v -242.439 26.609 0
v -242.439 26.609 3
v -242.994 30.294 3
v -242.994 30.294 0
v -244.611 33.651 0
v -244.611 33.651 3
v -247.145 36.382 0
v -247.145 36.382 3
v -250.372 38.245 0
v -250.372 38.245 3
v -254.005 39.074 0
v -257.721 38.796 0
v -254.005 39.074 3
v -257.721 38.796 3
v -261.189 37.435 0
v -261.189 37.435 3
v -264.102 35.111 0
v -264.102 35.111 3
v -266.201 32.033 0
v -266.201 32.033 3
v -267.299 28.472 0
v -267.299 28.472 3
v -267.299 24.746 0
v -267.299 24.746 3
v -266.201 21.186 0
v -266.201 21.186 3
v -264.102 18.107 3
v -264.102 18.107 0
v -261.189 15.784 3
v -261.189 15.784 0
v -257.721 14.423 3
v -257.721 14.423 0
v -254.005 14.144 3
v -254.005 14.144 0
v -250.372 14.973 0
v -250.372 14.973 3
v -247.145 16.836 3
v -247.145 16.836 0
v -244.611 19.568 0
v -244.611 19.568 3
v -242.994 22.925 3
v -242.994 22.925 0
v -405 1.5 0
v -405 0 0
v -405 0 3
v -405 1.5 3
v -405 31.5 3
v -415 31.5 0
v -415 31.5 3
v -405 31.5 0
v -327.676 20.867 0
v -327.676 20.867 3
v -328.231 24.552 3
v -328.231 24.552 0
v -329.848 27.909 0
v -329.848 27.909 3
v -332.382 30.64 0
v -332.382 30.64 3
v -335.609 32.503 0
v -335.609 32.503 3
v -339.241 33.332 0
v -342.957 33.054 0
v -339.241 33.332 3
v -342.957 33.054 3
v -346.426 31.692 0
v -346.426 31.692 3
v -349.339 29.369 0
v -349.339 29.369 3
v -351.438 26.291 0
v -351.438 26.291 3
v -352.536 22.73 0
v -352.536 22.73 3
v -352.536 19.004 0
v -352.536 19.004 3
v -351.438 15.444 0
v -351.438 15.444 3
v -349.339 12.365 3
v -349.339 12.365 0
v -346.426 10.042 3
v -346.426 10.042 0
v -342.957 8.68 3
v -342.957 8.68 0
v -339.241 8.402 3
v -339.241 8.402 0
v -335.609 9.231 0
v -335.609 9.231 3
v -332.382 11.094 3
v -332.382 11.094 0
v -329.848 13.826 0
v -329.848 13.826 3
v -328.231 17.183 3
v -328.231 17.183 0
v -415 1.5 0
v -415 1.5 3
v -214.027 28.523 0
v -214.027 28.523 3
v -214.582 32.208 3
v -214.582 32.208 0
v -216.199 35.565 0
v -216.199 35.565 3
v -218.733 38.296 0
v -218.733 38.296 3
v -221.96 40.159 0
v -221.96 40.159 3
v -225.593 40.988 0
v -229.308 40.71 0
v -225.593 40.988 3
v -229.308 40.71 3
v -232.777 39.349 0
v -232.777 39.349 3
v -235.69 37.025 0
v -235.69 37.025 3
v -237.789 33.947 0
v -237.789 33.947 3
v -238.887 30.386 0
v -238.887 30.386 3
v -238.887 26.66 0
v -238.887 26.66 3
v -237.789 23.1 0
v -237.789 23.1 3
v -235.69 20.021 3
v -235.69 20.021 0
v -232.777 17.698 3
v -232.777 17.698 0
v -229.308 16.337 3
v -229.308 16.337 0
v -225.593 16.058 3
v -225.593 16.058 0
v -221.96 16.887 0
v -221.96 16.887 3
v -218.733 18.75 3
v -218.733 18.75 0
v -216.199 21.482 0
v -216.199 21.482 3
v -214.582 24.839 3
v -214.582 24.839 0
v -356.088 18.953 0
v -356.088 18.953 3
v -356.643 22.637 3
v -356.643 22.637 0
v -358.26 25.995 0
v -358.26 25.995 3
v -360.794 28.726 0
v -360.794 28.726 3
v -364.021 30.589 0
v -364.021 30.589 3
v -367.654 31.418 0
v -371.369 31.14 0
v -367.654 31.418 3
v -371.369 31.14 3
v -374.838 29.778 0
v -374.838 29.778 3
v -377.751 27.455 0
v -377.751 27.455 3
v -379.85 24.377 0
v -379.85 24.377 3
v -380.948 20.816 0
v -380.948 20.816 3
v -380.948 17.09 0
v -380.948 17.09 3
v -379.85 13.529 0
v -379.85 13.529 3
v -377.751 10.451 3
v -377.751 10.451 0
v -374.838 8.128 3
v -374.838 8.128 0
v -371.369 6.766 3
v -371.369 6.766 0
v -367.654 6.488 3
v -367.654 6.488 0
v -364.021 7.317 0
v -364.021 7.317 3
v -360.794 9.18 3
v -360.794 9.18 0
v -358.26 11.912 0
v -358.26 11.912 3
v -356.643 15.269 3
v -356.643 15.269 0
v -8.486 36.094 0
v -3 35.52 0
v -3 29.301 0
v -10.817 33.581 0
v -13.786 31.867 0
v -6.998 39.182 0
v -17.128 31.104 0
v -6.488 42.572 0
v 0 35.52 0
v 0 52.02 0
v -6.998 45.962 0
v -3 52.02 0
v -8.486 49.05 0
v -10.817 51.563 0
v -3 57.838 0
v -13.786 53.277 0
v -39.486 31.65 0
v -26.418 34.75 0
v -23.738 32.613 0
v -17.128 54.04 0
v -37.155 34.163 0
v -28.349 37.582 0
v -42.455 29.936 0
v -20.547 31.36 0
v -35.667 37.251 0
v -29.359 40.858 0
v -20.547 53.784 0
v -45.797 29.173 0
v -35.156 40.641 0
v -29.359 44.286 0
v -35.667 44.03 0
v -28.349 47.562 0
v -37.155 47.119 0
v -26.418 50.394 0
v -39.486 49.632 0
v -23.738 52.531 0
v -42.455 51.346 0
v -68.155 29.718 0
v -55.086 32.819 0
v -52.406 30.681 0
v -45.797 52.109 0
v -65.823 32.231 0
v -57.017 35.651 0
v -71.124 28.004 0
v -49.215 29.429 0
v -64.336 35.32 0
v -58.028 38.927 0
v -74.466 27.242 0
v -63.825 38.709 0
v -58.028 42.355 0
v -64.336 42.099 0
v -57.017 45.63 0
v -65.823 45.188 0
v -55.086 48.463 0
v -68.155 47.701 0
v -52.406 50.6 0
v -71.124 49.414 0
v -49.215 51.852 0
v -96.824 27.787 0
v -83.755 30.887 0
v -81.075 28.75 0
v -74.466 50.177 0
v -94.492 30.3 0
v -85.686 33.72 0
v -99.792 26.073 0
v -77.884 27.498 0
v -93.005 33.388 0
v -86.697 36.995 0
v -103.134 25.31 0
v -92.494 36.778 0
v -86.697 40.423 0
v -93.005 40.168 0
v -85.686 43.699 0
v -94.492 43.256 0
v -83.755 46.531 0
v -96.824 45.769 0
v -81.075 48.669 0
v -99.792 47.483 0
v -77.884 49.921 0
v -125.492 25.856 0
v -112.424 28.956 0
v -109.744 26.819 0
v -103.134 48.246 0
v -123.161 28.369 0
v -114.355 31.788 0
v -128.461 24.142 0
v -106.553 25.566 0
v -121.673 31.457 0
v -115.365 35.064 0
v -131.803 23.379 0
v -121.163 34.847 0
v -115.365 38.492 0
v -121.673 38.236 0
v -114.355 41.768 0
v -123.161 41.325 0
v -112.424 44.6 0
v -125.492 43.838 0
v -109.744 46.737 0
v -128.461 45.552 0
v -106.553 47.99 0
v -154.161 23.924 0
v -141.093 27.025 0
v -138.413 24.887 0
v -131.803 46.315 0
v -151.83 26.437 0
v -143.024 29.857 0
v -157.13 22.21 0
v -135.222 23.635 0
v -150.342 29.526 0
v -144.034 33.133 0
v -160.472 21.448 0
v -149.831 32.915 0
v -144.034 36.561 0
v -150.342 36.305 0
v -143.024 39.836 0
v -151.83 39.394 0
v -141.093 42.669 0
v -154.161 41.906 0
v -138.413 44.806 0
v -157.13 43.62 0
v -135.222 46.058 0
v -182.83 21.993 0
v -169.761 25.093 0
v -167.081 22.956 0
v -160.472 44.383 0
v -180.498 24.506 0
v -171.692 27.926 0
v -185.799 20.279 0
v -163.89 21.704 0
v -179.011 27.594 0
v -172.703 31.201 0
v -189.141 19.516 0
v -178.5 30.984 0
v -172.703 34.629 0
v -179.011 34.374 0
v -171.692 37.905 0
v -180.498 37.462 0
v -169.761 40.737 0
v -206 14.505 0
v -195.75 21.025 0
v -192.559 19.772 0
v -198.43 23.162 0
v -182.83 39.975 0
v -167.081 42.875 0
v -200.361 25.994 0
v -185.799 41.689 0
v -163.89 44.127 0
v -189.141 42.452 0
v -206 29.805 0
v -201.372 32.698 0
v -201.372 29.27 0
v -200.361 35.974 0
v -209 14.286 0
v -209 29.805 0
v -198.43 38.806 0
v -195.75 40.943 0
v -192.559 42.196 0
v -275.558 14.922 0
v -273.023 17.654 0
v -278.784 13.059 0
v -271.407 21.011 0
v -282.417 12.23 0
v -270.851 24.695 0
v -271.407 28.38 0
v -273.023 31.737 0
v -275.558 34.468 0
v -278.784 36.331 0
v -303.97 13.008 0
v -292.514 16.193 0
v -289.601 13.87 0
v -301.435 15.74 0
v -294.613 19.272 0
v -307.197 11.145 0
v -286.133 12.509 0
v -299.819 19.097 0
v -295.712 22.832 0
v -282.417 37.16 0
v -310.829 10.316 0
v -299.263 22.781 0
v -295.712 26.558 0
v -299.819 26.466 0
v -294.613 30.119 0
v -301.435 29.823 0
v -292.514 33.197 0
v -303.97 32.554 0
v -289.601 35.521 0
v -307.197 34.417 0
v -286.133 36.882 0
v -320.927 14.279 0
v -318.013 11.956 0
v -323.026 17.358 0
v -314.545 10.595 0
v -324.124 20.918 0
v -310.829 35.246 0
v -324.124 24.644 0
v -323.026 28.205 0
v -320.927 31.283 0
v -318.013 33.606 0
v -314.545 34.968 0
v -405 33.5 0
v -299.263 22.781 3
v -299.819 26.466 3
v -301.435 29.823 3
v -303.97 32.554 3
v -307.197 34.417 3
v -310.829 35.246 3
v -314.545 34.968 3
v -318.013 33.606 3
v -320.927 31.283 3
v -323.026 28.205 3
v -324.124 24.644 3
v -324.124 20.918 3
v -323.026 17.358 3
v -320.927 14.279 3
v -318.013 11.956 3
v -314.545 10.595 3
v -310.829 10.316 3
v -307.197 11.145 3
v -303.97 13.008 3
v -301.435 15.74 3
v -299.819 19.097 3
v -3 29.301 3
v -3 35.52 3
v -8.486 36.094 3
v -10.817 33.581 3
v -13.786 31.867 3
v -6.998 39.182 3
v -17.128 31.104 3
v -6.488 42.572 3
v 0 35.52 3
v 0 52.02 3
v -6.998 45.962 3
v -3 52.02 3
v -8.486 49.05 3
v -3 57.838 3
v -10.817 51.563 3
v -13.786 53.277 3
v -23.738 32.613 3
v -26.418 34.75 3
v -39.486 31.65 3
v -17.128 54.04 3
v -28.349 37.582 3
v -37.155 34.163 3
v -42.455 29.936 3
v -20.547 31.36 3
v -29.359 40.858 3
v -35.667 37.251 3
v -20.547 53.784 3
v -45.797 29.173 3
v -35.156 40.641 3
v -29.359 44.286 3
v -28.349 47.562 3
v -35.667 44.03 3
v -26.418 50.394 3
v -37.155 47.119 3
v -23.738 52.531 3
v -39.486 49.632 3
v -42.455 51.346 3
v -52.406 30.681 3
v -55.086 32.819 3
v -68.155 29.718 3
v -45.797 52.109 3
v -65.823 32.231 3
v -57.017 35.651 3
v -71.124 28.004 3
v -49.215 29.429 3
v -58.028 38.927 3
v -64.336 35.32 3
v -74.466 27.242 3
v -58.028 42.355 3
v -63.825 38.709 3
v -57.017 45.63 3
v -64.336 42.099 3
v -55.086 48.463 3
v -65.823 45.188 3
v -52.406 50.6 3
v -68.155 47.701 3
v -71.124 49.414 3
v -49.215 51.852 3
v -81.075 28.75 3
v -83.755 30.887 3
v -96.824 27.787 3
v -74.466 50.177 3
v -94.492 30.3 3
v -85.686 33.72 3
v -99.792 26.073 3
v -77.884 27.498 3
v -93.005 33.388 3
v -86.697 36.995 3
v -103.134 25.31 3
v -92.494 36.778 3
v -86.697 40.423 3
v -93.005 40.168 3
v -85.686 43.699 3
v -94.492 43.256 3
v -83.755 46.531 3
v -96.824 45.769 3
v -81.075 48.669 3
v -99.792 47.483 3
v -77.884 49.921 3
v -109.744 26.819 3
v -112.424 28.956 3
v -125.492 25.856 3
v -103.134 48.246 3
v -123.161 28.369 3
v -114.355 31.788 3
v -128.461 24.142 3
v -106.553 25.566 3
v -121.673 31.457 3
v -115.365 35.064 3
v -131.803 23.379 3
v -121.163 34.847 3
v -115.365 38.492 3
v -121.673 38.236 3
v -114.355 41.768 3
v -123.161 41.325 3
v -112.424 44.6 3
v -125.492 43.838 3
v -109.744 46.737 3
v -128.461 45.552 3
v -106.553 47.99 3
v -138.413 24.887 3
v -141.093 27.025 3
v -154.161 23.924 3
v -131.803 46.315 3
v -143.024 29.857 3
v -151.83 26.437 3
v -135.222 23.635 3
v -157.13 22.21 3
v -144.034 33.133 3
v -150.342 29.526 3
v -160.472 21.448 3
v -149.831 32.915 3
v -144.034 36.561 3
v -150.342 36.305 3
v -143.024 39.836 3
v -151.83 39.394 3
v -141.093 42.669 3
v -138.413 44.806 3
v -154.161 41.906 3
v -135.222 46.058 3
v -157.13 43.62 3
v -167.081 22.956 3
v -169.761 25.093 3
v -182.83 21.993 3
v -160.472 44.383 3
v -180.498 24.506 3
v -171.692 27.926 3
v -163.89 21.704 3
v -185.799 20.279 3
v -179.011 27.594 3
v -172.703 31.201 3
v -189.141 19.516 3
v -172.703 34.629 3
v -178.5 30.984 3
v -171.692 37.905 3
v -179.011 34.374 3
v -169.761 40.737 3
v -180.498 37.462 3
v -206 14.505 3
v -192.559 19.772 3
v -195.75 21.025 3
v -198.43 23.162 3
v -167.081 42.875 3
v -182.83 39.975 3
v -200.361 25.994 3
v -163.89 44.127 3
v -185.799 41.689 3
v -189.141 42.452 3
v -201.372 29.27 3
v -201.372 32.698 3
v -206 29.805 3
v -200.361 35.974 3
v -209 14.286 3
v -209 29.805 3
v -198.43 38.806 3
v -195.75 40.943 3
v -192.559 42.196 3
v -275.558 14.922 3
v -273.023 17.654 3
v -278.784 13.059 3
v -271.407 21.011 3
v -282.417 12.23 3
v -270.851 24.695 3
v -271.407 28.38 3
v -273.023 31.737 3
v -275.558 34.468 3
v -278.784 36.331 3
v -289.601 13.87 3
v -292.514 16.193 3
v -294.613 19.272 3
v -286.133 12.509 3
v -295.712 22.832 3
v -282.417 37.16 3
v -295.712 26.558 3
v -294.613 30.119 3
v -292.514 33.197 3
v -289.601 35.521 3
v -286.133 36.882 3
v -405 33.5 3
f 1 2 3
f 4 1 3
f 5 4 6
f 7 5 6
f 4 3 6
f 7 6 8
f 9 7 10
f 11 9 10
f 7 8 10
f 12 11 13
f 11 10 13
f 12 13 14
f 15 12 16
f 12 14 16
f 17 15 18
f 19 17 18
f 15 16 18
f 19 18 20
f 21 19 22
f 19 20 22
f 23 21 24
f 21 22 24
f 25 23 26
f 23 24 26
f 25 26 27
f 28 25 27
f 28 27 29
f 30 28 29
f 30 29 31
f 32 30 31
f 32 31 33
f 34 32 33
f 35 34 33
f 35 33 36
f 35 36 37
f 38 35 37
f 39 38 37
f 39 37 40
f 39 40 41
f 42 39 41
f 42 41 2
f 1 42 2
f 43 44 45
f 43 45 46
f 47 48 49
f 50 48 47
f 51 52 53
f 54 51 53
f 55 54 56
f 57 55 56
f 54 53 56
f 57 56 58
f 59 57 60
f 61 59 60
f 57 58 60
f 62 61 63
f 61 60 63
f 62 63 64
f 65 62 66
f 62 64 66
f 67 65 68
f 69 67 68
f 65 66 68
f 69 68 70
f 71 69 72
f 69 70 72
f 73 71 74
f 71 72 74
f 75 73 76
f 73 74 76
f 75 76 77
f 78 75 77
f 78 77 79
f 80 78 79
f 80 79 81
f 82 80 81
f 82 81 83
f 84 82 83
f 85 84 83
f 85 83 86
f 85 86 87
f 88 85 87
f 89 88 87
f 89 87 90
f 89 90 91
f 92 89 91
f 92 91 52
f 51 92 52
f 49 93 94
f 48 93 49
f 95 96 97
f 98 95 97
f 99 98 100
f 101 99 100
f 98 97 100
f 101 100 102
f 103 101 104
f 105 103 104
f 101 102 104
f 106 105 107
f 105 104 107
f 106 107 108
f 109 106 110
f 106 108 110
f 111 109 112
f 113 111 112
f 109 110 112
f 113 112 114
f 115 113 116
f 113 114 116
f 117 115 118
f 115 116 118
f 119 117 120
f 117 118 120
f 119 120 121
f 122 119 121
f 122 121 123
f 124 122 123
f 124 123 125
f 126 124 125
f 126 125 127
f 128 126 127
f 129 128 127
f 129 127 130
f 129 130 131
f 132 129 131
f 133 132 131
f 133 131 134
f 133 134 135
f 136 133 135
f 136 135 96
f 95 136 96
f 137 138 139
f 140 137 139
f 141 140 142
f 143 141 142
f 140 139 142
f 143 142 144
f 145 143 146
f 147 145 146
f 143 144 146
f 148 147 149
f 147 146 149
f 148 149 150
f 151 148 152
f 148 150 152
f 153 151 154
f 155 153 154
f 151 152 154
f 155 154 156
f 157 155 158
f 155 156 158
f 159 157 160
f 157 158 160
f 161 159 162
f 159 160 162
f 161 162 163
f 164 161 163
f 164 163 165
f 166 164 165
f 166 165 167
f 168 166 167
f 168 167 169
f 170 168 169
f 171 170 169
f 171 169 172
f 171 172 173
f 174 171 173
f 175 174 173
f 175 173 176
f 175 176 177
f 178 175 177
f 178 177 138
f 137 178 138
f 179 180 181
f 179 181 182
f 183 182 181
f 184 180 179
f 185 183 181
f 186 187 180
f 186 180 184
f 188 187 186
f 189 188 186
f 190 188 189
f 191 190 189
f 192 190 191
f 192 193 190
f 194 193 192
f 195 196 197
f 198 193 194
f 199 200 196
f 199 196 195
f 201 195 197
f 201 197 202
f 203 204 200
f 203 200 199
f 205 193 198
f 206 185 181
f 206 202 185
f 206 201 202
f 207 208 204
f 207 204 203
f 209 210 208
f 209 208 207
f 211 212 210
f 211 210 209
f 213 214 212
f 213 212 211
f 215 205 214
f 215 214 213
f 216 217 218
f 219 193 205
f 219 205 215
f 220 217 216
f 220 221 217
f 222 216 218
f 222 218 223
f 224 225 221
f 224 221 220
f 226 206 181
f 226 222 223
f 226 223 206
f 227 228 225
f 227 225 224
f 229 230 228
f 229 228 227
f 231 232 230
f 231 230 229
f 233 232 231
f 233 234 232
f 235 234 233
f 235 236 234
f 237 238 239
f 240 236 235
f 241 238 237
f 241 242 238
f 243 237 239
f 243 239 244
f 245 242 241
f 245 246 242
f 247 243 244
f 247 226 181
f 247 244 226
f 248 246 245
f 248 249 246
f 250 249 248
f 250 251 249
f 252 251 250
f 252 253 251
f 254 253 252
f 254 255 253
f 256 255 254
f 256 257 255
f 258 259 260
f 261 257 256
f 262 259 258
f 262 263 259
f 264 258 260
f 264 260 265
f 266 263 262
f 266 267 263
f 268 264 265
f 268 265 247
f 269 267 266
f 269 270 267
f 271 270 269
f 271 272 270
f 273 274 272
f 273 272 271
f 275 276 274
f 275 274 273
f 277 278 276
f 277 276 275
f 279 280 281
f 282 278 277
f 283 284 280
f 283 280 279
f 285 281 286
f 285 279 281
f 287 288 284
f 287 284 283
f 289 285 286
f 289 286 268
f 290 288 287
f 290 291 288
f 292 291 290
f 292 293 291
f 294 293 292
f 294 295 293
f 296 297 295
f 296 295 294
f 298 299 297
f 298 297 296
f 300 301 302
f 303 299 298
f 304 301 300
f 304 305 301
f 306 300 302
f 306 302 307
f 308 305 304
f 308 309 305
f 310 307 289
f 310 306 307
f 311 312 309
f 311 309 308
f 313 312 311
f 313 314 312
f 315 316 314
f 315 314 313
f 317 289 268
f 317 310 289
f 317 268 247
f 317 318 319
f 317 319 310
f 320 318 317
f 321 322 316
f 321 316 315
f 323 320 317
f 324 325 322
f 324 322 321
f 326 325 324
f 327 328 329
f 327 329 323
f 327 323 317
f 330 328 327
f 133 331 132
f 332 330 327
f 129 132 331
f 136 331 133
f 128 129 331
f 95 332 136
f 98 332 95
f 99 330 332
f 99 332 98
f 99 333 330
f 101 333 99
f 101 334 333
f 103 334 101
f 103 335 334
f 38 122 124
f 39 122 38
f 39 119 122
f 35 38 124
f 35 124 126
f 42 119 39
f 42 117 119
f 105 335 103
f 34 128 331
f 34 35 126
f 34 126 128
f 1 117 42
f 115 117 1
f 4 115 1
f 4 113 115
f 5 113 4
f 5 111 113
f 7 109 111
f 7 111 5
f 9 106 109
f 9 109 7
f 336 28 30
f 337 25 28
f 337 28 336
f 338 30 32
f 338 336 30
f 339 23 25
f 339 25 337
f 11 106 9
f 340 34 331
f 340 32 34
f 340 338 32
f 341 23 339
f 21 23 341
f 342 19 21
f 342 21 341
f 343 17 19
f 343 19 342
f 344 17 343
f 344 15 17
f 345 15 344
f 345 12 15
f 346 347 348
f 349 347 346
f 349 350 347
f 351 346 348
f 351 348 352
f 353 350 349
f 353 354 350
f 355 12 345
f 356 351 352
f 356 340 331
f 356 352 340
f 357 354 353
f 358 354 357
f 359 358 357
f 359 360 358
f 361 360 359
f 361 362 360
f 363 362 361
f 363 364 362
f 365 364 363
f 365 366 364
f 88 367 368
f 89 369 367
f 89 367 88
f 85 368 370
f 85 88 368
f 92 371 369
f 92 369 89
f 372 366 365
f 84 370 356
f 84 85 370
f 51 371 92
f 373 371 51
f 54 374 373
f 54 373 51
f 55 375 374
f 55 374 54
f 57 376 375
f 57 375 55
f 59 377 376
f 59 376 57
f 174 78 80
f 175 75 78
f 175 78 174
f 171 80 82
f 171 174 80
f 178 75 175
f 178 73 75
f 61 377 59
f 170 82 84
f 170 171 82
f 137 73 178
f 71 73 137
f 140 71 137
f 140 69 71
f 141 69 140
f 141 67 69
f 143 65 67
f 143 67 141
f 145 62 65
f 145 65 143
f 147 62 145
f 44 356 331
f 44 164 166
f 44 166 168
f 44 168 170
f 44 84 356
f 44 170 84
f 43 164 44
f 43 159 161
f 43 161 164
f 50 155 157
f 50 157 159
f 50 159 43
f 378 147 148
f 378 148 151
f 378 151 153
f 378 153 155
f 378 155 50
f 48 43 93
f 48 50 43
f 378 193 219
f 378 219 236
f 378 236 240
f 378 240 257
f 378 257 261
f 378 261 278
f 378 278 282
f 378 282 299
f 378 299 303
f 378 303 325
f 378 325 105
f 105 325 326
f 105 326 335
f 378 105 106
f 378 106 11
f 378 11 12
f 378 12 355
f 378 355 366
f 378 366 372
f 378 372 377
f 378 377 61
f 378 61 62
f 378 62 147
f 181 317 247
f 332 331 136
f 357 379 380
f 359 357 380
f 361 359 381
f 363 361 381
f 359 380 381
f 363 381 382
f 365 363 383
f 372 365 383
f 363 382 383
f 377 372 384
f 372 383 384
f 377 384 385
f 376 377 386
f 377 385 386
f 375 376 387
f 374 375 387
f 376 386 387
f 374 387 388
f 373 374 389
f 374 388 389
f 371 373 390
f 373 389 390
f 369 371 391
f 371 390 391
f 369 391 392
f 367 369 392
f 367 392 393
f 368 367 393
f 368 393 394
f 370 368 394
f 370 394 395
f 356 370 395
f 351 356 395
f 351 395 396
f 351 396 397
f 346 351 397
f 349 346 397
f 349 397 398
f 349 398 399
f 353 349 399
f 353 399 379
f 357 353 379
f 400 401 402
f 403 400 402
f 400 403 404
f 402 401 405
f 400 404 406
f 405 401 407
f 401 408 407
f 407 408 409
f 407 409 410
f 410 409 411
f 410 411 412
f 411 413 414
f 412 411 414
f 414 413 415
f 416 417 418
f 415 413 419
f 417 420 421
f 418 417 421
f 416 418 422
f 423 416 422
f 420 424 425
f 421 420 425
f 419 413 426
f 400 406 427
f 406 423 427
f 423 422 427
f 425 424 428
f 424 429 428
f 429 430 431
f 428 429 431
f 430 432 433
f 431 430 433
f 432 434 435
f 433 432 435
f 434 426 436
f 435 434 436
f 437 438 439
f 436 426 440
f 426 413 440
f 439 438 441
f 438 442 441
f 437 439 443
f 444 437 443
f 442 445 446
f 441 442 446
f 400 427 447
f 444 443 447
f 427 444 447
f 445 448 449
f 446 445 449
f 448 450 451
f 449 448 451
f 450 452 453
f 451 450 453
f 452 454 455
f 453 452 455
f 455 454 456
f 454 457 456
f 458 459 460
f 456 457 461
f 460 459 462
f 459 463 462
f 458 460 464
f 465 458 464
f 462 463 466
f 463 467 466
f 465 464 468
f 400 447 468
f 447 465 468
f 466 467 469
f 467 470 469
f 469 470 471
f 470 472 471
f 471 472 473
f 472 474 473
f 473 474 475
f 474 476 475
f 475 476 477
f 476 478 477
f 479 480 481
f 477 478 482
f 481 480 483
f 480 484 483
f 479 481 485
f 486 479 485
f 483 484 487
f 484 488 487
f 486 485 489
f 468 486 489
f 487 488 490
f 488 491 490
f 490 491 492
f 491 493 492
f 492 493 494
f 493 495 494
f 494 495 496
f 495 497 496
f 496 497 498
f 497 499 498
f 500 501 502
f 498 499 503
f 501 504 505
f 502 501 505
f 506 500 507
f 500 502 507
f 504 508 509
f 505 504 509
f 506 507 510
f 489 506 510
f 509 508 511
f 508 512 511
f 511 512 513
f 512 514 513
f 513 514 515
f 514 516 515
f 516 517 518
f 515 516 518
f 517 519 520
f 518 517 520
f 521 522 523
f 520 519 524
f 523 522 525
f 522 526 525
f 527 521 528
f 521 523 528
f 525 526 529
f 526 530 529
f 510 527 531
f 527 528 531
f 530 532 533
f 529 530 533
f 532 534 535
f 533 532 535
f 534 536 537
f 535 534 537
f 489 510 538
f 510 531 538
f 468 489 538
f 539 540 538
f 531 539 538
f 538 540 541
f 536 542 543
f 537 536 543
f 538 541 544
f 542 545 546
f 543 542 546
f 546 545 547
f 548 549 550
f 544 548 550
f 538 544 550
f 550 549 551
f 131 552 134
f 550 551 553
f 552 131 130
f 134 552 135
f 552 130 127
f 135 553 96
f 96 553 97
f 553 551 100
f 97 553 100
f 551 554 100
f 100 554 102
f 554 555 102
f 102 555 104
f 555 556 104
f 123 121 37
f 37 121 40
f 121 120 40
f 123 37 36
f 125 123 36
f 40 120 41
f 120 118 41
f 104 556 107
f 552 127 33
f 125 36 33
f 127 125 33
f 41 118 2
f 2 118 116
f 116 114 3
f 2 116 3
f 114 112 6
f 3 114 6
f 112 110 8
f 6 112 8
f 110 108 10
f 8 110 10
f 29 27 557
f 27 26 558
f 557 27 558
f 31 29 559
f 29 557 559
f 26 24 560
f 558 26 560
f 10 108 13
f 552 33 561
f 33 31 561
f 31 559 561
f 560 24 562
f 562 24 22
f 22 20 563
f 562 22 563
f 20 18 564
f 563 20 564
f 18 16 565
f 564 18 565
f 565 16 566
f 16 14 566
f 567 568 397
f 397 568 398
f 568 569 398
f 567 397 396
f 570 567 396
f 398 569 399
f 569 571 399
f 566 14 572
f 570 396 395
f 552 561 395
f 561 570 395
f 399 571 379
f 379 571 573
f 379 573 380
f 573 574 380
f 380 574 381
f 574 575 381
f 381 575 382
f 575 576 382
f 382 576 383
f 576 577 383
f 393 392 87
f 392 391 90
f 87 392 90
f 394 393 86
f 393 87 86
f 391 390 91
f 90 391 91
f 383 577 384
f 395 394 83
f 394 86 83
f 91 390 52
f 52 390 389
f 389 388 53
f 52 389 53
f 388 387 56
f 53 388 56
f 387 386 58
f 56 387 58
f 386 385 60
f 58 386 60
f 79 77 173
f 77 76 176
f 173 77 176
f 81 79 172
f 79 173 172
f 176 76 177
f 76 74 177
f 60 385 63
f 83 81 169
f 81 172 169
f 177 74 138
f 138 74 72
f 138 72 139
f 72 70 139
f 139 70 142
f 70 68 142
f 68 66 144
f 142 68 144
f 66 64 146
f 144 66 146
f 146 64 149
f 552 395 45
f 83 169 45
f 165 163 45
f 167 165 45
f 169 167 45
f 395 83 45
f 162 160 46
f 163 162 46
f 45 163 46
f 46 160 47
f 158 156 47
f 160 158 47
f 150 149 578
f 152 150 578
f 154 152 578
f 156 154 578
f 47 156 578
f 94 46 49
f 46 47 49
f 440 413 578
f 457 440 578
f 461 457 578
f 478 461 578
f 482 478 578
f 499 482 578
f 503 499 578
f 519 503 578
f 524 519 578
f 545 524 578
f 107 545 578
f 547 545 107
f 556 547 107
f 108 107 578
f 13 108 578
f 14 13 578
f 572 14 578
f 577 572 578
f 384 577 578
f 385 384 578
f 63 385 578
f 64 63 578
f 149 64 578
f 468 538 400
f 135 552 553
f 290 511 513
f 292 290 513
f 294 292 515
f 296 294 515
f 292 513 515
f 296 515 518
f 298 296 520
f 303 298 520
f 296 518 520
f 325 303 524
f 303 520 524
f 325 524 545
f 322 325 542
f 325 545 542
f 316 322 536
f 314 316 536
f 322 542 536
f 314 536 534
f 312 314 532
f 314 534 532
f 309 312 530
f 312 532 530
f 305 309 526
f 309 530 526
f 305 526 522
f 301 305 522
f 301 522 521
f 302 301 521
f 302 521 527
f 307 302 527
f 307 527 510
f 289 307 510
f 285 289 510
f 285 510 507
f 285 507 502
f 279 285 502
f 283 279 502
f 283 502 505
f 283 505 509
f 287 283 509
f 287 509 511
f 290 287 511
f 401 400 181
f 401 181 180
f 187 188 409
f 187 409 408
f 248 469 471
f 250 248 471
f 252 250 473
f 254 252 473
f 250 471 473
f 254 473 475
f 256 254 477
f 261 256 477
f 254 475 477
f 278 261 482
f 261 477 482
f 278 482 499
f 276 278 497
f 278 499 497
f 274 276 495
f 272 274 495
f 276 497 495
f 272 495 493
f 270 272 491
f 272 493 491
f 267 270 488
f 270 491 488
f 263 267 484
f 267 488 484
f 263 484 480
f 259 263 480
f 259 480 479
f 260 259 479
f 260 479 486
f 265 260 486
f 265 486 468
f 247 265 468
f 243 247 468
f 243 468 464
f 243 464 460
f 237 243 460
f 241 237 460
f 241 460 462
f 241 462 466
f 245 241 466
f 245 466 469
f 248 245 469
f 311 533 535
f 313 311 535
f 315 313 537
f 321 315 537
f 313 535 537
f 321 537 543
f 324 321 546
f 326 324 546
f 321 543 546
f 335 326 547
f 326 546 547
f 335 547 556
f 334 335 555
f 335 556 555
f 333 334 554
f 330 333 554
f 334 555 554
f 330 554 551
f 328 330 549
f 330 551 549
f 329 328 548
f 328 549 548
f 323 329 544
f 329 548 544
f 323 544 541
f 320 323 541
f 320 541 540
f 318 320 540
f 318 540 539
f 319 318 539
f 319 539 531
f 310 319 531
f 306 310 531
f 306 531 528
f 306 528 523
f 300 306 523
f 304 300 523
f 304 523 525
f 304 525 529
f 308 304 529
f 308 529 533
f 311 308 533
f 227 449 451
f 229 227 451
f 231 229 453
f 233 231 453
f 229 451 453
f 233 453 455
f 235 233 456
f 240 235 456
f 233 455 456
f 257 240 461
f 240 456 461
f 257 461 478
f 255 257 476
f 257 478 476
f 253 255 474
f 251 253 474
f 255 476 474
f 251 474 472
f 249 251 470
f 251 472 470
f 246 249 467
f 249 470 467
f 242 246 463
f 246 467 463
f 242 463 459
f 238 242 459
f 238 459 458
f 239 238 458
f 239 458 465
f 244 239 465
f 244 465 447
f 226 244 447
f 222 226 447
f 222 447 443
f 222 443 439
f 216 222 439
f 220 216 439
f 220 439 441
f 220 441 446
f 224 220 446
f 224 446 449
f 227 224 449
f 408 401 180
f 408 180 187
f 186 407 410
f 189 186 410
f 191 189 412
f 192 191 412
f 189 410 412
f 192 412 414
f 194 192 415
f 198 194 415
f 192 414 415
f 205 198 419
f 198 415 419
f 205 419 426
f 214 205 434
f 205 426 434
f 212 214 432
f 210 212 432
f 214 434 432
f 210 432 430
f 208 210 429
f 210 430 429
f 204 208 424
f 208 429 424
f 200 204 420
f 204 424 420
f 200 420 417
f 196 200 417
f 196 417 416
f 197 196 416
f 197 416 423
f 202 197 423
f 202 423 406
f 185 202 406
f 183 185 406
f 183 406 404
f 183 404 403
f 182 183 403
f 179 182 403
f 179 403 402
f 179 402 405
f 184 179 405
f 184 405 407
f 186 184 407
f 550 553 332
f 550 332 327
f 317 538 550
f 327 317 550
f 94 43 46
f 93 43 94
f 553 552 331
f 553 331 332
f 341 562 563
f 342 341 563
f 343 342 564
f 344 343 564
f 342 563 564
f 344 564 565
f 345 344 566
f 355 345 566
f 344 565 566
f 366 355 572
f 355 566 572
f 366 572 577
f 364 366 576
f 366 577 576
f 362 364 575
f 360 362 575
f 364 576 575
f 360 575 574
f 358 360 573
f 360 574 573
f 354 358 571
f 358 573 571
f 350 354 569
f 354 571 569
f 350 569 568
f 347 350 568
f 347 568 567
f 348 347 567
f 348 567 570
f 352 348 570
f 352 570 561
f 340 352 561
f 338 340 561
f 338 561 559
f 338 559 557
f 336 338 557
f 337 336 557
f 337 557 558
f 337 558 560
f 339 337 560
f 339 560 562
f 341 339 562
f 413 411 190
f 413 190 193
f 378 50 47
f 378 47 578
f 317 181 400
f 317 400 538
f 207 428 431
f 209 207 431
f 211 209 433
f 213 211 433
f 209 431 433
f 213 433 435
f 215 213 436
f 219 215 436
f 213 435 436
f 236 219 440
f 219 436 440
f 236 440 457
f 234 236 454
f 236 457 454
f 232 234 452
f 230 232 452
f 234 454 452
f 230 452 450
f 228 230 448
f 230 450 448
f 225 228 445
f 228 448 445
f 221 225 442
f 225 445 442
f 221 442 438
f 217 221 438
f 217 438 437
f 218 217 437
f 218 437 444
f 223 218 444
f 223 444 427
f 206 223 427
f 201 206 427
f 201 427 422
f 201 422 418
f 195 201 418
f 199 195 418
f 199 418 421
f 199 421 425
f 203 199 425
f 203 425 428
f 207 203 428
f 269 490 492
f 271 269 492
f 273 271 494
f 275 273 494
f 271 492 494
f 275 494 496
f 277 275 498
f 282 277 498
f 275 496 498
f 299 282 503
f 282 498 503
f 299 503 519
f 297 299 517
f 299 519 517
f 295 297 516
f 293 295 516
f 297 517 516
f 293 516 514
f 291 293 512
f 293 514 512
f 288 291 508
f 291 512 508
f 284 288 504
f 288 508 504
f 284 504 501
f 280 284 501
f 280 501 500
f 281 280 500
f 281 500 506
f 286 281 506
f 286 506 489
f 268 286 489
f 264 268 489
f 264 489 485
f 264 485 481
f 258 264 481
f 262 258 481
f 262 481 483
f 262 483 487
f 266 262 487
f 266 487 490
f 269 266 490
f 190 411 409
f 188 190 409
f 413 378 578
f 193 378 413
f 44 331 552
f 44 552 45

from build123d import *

# Parameters (mm, degrees)
BOSS_EXTRUDE1_DEPTH     = 3
SKETCH2_R               = 12.5
SKETCH2_R_2             = 11.5
SKETCH2_W               = 3
SKETCH2_H               = 15.519078079
CUT_EXTRUDE1_DEPTH      = 1
CUT_EXTRUDE1_DEPTH_BACK = 4
SKETCH3_W               = 3
SKETCH3_H               = 6
SKETCH3_H_2             = 7.329652721
CUT_EXTRUDE2_DEPTH      = 10


with BuildPart() as part:
    # Sketch1 → Boss-Extrude1 (new body)
    with BuildSketch(Plane.XY):
        Polygon((-415, 1.5), (-415, 31.5), (-405, 31.5), (-405, 33.5), (0, 58.019626957), (0, 29.519626957), (-405, 0), (-405, 1.5), align=None)
    extrude(amount=BOSS_EXTRUDE1_DEPTH)

    # Sketch2 → Cut-Extrude1 (cut, two sides)
    with BuildSketch(Plane.XY.offset(3)) as cut_extrude1_sk:
        with Locations((-368.587798604, 18.953006079)):
            Circle(SKETCH2_R)
        with Locations((-340.175597209, 20.867070597)):
            Circle(SKETCH2_R)
        with Locations((-311.763395813, 22.781135116)):
            Circle(SKETCH2_R)
        with Locations((-283.351194418, 24.695199634)):
            Circle(SKETCH2_R)
        with Locations((-254.938993022, 26.609264153)):
            Circle(SKETCH2_R)
        with Locations((-226.526791627, 28.523328671)):
            Circle(SKETCH2_R)
        with Locations((-190, 30.98405443)):
            Circle(SKETCH2_R_2)
        with Locations((-161.331258472, 32.915401465)):
            Circle(SKETCH2_R_2)
        with Locations((-132.662516945, 34.846748501)):
            Circle(SKETCH2_R_2)
        with Locations((-103.993775417, 36.778095537)):
            Circle(SKETCH2_R_2)
        with Locations((-75.325033889, 38.709442573)):
            Circle(SKETCH2_R_2)
        with Locations((-46.656292362, 40.640789609)):
            Circle(SKETCH2_R_2)
        with Locations((-17.987550834, 42.572136645)):
            Circle(SKETCH2_R_2)
        with Locations((-207.5, 22.045580728)):
            Rectangle(SKETCH2_W, SKETCH2_H)
    extrude(amount=CUT_EXTRUDE1_DEPTH, mode=Mode.SUBTRACT)
    extrude(cut_extrude1_sk.sketch, amount=-CUT_EXTRUDE1_DEPTH_BACK, mode=Mode.SUBTRACT)

    # Sketch3 → Cut-Extrude2 (cut)
    with BuildSketch(Plane.XY.offset(3)):
        with Locations((-1.5, 55.019626957)):
            Rectangle(SKETCH3_W, SKETCH3_H)
        with Locations((-1.5, 31.854800596)):
            Rectangle(SKETCH3_W, SKETCH3_H_2)
    extrude(amount=-CUT_EXTRUDE2_DEPTH, mode=Mode.SUBTRACT)


solid = part.part
